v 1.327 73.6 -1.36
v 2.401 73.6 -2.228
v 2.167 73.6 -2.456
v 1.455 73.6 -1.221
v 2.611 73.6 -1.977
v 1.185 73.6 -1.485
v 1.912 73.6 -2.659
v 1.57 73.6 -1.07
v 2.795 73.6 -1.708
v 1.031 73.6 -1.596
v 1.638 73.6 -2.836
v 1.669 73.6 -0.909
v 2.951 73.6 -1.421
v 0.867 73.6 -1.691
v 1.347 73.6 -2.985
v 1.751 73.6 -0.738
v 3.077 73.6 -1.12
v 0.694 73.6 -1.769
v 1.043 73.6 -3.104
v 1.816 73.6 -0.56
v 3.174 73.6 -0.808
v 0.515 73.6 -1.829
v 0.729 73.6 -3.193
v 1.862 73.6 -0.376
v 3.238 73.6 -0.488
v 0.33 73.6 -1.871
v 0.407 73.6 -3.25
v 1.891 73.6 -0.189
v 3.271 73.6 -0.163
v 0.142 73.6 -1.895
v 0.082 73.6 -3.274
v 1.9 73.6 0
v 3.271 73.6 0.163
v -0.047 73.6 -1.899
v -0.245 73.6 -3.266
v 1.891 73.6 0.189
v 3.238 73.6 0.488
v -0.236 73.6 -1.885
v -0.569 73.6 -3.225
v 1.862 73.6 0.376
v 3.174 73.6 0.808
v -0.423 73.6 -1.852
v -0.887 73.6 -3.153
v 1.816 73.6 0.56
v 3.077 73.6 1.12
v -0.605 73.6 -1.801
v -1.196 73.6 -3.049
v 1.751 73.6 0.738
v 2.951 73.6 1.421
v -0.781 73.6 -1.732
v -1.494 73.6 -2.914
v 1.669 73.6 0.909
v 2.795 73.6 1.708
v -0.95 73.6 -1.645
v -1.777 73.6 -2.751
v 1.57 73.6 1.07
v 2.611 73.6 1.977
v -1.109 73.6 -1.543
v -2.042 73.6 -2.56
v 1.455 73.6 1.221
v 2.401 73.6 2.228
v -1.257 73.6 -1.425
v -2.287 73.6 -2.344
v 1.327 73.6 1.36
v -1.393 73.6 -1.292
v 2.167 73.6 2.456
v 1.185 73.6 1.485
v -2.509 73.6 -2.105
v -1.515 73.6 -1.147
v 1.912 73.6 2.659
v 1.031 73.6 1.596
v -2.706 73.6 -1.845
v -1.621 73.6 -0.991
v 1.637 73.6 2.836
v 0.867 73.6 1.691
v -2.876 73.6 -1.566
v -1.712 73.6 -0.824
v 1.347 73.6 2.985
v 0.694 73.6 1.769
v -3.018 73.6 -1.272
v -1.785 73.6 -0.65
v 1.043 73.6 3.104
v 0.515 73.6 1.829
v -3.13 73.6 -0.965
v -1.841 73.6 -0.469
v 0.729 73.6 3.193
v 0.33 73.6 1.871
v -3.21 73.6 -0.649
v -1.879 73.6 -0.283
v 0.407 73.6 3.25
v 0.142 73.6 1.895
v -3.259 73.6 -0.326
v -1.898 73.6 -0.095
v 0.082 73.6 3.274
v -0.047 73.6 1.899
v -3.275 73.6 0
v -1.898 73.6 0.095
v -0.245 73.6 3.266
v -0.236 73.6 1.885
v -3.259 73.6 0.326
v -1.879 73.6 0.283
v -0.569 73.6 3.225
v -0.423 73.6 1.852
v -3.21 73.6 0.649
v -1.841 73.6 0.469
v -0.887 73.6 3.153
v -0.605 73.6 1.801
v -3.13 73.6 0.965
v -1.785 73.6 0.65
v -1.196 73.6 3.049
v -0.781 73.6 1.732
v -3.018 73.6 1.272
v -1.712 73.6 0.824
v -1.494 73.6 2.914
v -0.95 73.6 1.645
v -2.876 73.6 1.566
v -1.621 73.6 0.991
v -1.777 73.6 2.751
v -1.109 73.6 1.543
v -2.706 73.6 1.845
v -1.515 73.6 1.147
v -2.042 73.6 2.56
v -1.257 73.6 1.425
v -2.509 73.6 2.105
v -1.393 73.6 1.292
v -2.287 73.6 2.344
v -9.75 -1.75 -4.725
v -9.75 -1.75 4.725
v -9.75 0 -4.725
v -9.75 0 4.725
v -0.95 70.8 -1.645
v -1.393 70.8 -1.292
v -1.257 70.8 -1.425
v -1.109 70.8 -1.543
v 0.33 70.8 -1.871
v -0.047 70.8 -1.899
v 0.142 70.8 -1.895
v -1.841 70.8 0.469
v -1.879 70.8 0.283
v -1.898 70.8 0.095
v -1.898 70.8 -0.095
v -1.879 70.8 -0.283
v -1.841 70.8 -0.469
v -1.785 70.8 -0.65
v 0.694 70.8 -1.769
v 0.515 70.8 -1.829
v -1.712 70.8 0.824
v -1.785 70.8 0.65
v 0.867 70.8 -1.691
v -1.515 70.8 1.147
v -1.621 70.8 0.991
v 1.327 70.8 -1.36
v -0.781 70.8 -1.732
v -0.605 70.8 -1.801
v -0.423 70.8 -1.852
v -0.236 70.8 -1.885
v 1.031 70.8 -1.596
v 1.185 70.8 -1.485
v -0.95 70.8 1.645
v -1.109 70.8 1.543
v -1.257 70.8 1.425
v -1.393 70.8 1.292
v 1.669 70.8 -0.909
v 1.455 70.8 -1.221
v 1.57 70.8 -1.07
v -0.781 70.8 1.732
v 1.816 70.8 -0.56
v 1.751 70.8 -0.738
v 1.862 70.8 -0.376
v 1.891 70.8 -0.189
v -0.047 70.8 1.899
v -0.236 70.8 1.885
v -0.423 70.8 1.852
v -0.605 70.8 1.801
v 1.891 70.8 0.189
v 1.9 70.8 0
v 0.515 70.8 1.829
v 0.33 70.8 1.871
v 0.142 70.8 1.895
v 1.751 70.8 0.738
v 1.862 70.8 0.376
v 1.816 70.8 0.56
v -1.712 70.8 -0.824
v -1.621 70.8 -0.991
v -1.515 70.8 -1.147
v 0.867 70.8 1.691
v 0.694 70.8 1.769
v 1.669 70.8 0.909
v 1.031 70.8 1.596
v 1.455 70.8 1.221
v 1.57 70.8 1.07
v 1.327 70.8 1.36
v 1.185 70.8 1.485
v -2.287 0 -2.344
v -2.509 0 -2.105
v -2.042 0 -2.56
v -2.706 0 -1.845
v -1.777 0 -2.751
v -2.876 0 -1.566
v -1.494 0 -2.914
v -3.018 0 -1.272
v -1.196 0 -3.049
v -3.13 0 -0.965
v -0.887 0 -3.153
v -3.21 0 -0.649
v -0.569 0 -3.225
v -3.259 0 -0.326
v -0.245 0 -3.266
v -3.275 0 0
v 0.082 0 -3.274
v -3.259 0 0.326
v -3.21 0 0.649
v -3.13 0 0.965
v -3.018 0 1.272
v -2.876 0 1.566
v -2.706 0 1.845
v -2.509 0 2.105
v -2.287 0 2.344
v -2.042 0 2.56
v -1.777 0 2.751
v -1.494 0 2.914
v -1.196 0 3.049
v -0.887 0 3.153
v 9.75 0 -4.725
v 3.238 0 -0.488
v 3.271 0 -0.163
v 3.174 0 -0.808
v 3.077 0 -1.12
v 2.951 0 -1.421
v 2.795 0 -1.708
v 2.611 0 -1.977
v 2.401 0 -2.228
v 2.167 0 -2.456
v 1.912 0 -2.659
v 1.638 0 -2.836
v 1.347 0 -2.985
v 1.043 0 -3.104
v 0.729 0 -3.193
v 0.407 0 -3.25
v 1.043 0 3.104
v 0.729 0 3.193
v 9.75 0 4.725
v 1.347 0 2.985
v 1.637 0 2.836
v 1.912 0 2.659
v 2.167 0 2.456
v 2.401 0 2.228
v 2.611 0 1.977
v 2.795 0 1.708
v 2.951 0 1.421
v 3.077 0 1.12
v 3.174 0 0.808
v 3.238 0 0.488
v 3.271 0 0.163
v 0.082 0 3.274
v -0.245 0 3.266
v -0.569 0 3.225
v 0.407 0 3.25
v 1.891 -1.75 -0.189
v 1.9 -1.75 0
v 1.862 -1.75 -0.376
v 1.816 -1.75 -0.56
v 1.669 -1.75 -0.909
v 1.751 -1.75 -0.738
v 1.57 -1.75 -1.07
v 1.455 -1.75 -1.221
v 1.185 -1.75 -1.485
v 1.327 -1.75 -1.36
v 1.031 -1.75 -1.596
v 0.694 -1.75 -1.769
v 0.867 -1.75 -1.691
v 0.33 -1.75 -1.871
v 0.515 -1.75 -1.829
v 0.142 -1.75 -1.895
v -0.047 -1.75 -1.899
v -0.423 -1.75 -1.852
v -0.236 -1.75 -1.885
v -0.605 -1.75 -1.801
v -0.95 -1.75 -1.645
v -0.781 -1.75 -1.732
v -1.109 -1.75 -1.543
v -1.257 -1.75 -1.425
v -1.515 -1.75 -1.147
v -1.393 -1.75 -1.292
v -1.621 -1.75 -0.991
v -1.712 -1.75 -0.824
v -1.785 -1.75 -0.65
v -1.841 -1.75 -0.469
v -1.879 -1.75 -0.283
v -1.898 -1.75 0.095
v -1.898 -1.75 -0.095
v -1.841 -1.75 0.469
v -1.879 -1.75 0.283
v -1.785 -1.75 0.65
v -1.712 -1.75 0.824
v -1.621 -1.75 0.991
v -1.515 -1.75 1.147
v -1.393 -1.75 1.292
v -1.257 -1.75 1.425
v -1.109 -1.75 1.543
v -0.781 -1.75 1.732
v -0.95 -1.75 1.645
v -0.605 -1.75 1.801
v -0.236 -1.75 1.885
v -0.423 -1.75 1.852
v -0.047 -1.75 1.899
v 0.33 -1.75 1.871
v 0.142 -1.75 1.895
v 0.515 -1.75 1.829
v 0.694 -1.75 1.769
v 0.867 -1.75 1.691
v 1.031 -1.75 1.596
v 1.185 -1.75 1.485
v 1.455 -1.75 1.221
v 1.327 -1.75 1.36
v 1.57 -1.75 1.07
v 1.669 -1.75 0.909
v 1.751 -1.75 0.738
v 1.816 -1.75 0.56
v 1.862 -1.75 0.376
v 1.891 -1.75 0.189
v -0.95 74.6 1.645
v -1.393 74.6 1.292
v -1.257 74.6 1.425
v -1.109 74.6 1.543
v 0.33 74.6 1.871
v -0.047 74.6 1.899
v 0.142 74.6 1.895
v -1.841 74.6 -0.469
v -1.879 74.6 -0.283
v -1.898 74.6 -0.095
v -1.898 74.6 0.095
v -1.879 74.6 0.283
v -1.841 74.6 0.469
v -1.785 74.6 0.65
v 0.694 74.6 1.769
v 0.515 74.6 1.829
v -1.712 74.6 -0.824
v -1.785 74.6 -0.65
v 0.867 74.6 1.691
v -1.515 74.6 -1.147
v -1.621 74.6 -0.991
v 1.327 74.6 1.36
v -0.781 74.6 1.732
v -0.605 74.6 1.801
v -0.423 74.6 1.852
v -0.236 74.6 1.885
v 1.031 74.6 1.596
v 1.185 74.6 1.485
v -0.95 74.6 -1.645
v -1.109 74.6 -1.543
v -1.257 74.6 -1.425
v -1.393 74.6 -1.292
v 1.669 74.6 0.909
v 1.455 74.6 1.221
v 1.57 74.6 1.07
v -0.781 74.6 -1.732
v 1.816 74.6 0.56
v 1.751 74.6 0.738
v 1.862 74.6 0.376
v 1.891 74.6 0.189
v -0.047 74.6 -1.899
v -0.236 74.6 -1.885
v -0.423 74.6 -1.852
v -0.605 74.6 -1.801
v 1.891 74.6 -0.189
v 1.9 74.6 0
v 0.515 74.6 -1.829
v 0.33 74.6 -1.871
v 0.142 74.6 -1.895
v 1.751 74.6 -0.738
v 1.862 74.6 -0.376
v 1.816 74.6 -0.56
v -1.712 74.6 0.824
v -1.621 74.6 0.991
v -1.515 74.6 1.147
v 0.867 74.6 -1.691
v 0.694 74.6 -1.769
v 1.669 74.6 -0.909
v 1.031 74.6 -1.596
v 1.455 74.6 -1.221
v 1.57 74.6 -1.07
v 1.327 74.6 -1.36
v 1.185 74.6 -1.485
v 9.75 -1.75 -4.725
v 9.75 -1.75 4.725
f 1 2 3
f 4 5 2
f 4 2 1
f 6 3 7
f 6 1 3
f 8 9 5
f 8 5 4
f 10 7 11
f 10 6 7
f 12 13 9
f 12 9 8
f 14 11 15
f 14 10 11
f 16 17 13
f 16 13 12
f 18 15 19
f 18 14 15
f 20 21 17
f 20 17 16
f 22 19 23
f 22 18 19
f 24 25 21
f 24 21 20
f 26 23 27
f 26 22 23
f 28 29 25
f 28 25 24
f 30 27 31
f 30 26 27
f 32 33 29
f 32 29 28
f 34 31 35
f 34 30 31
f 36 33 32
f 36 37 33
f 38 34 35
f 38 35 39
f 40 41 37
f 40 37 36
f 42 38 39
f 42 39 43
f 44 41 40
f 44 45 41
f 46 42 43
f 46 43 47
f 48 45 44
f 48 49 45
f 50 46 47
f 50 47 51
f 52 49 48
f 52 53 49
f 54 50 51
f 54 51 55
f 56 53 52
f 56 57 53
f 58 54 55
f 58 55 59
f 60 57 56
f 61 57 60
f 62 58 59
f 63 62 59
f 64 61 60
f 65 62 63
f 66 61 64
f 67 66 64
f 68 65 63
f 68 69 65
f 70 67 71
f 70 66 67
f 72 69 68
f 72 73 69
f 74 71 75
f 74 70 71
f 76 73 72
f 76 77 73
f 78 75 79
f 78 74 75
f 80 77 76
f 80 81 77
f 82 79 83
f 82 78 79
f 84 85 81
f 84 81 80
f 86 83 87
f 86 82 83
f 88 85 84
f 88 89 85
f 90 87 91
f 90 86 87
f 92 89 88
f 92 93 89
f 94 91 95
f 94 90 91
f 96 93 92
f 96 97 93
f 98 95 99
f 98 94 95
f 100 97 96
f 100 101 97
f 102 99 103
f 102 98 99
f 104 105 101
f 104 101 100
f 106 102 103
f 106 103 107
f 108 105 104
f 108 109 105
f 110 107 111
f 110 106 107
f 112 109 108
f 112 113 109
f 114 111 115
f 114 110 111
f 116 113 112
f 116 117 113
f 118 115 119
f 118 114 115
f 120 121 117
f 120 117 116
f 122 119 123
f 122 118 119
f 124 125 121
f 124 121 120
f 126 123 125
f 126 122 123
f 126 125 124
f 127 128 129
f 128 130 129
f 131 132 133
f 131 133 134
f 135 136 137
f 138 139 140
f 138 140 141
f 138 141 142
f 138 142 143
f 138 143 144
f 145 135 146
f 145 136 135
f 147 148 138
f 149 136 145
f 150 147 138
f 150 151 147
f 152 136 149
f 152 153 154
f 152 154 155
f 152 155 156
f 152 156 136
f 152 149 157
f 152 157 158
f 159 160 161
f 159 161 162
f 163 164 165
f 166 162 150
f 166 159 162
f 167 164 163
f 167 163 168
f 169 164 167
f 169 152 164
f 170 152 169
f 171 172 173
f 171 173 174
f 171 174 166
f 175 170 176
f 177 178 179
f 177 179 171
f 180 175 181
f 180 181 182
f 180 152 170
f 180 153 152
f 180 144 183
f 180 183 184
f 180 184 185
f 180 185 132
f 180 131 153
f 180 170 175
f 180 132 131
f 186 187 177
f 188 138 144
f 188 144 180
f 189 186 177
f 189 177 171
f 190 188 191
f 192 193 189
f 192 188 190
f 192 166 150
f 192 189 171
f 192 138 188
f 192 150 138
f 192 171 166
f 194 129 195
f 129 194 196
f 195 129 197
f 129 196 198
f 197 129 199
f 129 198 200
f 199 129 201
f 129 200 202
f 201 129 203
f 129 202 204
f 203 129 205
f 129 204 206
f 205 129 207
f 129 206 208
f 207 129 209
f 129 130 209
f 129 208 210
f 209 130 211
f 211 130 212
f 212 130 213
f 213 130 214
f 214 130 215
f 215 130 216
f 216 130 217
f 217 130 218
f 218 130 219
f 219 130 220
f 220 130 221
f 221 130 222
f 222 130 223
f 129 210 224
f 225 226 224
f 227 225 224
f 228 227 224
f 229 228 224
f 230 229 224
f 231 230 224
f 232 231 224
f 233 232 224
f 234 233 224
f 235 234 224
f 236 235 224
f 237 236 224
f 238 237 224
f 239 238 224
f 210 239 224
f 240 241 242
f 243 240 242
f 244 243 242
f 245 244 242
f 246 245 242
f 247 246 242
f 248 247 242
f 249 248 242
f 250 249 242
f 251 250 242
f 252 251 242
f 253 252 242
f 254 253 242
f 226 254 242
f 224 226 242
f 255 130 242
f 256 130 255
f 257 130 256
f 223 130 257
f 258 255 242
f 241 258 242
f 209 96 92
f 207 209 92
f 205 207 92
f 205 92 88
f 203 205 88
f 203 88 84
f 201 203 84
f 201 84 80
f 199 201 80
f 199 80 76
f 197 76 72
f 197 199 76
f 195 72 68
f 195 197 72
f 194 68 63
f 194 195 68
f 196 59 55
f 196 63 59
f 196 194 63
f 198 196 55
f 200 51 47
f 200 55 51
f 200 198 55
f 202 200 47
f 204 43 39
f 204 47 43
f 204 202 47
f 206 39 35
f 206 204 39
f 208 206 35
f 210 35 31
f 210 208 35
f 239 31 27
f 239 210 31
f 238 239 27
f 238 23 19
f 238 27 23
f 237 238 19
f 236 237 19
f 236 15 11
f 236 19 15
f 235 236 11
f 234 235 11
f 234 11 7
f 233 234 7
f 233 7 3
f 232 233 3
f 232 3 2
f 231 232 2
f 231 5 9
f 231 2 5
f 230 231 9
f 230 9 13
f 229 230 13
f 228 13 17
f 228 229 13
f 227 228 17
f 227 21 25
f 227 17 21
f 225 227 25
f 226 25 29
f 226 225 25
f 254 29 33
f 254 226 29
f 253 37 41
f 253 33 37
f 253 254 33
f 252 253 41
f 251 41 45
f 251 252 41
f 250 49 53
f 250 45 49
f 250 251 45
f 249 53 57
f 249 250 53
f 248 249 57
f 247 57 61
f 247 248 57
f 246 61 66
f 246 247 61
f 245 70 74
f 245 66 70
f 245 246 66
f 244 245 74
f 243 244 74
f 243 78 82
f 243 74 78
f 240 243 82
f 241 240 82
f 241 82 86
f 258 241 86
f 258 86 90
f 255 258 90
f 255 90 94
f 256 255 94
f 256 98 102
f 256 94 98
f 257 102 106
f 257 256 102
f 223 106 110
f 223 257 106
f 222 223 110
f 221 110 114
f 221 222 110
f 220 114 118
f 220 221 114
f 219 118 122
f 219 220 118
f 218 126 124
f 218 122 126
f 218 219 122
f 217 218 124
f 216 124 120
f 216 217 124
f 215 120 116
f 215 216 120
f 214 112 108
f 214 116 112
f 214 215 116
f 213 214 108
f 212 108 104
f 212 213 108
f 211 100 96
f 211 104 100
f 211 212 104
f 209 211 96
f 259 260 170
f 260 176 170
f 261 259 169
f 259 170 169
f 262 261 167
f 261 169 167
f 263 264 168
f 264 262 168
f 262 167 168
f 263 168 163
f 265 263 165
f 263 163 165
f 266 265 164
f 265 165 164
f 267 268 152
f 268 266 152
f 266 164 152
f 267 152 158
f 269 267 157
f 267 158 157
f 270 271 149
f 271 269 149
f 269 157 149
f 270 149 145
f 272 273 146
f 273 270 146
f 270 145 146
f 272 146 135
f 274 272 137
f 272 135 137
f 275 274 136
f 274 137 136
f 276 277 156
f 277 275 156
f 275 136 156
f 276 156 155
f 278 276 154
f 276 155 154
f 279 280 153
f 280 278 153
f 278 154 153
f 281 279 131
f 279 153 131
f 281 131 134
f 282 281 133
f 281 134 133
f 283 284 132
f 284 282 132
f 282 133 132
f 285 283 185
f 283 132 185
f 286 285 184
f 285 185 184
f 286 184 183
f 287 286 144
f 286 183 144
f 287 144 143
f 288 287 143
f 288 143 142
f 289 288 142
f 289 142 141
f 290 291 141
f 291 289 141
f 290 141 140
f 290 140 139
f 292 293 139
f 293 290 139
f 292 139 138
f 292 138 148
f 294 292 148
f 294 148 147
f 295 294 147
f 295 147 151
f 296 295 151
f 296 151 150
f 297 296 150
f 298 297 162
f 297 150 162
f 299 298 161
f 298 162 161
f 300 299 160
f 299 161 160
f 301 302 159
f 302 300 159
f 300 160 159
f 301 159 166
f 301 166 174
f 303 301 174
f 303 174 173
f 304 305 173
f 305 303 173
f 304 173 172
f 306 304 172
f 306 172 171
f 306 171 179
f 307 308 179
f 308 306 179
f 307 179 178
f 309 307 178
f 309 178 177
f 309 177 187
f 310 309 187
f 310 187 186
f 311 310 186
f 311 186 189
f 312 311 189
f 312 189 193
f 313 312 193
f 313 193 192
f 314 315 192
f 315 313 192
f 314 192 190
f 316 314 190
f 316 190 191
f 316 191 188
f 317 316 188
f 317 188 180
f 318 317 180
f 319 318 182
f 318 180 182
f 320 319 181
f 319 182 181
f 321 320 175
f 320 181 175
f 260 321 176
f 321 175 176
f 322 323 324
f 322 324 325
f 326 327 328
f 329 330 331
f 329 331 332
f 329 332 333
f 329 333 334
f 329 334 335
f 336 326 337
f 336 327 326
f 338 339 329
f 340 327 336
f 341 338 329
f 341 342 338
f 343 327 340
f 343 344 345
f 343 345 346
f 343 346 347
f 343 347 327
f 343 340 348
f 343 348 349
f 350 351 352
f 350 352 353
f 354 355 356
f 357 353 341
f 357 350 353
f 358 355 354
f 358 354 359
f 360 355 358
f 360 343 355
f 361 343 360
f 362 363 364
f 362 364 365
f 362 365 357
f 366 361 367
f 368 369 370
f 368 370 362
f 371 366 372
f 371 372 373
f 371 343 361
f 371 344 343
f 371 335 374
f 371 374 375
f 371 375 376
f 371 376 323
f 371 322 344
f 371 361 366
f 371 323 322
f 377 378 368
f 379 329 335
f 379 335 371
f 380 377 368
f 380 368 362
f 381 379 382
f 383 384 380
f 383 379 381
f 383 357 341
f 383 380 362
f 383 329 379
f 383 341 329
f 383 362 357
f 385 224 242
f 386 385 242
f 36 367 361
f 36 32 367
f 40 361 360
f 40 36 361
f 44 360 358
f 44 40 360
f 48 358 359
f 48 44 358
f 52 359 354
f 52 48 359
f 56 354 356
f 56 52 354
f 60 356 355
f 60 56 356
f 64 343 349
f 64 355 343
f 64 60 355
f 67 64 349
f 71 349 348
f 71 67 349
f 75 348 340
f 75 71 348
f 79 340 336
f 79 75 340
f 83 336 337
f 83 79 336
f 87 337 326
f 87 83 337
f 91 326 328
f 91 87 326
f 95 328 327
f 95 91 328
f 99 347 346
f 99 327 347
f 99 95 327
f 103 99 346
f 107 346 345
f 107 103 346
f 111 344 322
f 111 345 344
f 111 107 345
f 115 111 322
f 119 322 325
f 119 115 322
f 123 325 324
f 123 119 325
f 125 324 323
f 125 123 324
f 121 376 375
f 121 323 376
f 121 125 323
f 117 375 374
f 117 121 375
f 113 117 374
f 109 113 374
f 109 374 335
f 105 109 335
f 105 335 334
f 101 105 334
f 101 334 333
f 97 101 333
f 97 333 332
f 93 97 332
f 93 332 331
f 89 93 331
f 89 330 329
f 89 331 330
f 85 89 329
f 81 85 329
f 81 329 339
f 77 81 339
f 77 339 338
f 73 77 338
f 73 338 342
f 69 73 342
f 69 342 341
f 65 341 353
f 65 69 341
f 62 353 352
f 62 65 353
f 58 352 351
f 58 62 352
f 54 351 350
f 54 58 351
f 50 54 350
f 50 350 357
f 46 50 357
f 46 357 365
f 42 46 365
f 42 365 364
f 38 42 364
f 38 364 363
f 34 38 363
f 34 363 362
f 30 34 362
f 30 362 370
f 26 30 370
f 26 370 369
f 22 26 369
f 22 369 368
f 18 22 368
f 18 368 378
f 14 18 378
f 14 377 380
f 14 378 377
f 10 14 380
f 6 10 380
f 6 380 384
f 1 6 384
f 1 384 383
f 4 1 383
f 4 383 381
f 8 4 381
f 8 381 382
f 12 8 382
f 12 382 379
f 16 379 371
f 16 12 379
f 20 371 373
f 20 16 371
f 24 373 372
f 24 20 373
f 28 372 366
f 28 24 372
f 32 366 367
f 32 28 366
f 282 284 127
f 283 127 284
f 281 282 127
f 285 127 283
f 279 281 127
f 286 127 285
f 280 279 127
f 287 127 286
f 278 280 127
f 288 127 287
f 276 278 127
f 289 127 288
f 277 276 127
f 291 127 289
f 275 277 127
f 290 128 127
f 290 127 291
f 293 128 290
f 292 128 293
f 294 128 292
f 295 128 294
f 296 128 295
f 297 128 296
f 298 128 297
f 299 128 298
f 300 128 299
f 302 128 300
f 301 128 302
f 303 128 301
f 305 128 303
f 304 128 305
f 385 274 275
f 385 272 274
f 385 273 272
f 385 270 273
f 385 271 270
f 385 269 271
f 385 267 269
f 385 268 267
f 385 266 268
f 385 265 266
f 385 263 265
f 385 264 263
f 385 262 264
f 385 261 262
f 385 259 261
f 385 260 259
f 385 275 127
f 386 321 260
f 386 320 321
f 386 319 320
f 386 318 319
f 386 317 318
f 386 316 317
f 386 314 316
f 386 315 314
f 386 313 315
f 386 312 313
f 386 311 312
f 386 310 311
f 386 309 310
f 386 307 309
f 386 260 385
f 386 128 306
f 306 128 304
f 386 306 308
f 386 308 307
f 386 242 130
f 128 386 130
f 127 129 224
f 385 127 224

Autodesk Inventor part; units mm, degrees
ref_plane "YZ Plane" through (0, 0, 0) normal (1, 0, 0) x (0, 1, 0)
ref_plane "XZ Plane" through (0, 0, 0) normal (0, 1, 0) x (-1, 0, 0)
ref_plane "XY Plane" through (0, 0, 0) normal (0, 0, 1) x (1, 0, 0)
sketch "Sketch1" plane through (0, 0, 0) normal (0, 1, 0) x (-1, 0, 0)
  circle A0 centre (0, 0) radius 3.275
  dimension "d0" = 6.55
extrude "Extrusion1" add sketch "Sketch1" along normal blind 73.6
sketch "Sketch2" plane through (0, 0, 0) normal (0, -1, 0) x (1, 0, 0)
  circle A0 centre (0, 0) radius 1.9
  dimension "d3" = 3.8
extrude "Extrusion2" cut sketch "Sketch2" against normal blind 70.8
sketch "Sketch3" plane through (0, 73.6, 0) normal (0, 1, 0) x (1, 0, 0)
  circle A0 centre (0, 0) radius 1.9
extrude "Extrusion3" add sketch "Sketch3" along normal blind 1
sketch "Sketch4" plane through (0, 0, 0) normal (0, -1, 0) x (1, 0, 0)
  line L0 (0, 0) -> (0, 4.725)
  line L1 (0, 4.725) -> (0, -4.725)
  line L2 (0, 4.725) -> (9.75, 4.725)
  line L3 (9.75, 4.725) -> (-9.75, 4.725)
  line L4 (-9.75, 4.725) -> (-9.75, -4.725)
  line L5 (-9.75, -4.725) -> (9.75, -4.725)
  line L6 (9.75, -4.725) -> (9.75, 4.725)
  circle A0 centre (0, 0) radius 1.9 projected
  dimension "d8" = 4.725
  dimension "d9" = 9.45
  dimension "d10" = 9.75
  dimension "d11" = 19.5
extrude "Extrusion4" add sketch "Sketch4" along normal blind 1.75 contours A0 L1 L5 L4 L3 L0 | L0 L2 L6 L5 L1 A0
properties part number "SyringeBody"
